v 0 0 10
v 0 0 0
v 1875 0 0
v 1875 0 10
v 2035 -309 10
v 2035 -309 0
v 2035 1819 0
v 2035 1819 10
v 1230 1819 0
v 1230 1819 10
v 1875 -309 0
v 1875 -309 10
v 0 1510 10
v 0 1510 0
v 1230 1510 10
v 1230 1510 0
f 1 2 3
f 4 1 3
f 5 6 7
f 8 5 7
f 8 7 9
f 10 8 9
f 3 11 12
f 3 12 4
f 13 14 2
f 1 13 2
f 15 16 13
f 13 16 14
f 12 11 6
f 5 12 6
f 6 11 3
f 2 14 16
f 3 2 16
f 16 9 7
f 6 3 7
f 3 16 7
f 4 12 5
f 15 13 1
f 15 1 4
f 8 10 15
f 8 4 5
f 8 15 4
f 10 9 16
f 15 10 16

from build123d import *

# Parameters (mm, degrees)
BOSS_EXTRUDE1_DEPTH = 10
CUT_EXTRUDE2_DEPTH  = 330
SKETCH4_W           = 178
SKETCH4_H           = 12
CUT_EXTRUDE3_DEPTH  = 2730.484566727
SKETCH5_W           = 12
SKETCH5_H           = 309
CUT_EXTRUDE4_DEPTH  = 10


with BuildPart() as part:
    # Sketch1 → Boss-Extrude1 (new body)
    with BuildSketch(Plane.XY):
        Polygon((1230, 1510), (0, 1510), (0, 0), (1685, 0), (1685, -309), (2035, -309), (2035, 1819), (1230, 1819), align=None)
    extrude(amount=BOSS_EXTRUDE1_DEPTH)

    # Sketch3 → Cut-Extrude2 (cut)
    with BuildSketch(Plane(origin=(-124.112118138, -342, 1004.457487155), x_dir=(-1, 0, 0), z_dir=(0, -1, 0))):
        with BuildLine():
            Line((-1887.112118138, 819.457487155), (-1466.112118138, 819.457487155))
            ThreePointArc((-1466.112118138, 819.457487155), (-1395.40144002, 848.746809036), (-1366.112118138, 919.457487155))
            Line((-1366.112118138, 919.457487155), (-1366.112118138, 2569.457487155))
            ThreePointArc((-1366.112118138, 2569.457487155), (-1395.40144002, 2640.168165273), (-1466.112118138, 2669.457487155))
            Line((-1466.112118138, 2669.457487155), (-1887.112118138, 2669.457487155))
            ThreePointArc((-1887.112118138, 2669.457487155), (-1957.822796257, 2640.168165273), (-1987.112118138, 2569.457487155))
            Line((-1987.112118138, 2569.457487155), (-1987.112118138, 919.457487155))
            ThreePointArc((-1987.112118138, 919.457487155), (-1957.822796257, 848.746809036), (-1887.112118138, 819.457487155))
        make_face()
    extrude(amount=-CUT_EXTRUDE2_DEPTH, mode=Mode.SUBTRACT)

    # Sketch4 → Cut-Extrude3 (cut, through all)
    with BuildSketch(Plane(origin=(0, 0, 0), x_dir=(-1, 0, 0), z_dir=(0, 0, -1))):
        with Locations((-1774, -6)):
            Rectangle(SKETCH4_W, SKETCH4_H)
    extrude(amount=-CUT_EXTRUDE3_DEPTH, mode=Mode.SUBTRACT)

    # Sketch5 → Cut-Extrude4 (cut)
    with BuildSketch(Plane(origin=(0, 0, 0), x_dir=(-1, 0, 0), z_dir=(0, 0, -1))):
        with Locations((-1869, -154.5)):
            Rectangle(SKETCH5_W, SKETCH5_H)
    extrude(amount=-CUT_EXTRUDE4_DEPTH, mode=Mode.SUBTRACT)


solid = part.part
